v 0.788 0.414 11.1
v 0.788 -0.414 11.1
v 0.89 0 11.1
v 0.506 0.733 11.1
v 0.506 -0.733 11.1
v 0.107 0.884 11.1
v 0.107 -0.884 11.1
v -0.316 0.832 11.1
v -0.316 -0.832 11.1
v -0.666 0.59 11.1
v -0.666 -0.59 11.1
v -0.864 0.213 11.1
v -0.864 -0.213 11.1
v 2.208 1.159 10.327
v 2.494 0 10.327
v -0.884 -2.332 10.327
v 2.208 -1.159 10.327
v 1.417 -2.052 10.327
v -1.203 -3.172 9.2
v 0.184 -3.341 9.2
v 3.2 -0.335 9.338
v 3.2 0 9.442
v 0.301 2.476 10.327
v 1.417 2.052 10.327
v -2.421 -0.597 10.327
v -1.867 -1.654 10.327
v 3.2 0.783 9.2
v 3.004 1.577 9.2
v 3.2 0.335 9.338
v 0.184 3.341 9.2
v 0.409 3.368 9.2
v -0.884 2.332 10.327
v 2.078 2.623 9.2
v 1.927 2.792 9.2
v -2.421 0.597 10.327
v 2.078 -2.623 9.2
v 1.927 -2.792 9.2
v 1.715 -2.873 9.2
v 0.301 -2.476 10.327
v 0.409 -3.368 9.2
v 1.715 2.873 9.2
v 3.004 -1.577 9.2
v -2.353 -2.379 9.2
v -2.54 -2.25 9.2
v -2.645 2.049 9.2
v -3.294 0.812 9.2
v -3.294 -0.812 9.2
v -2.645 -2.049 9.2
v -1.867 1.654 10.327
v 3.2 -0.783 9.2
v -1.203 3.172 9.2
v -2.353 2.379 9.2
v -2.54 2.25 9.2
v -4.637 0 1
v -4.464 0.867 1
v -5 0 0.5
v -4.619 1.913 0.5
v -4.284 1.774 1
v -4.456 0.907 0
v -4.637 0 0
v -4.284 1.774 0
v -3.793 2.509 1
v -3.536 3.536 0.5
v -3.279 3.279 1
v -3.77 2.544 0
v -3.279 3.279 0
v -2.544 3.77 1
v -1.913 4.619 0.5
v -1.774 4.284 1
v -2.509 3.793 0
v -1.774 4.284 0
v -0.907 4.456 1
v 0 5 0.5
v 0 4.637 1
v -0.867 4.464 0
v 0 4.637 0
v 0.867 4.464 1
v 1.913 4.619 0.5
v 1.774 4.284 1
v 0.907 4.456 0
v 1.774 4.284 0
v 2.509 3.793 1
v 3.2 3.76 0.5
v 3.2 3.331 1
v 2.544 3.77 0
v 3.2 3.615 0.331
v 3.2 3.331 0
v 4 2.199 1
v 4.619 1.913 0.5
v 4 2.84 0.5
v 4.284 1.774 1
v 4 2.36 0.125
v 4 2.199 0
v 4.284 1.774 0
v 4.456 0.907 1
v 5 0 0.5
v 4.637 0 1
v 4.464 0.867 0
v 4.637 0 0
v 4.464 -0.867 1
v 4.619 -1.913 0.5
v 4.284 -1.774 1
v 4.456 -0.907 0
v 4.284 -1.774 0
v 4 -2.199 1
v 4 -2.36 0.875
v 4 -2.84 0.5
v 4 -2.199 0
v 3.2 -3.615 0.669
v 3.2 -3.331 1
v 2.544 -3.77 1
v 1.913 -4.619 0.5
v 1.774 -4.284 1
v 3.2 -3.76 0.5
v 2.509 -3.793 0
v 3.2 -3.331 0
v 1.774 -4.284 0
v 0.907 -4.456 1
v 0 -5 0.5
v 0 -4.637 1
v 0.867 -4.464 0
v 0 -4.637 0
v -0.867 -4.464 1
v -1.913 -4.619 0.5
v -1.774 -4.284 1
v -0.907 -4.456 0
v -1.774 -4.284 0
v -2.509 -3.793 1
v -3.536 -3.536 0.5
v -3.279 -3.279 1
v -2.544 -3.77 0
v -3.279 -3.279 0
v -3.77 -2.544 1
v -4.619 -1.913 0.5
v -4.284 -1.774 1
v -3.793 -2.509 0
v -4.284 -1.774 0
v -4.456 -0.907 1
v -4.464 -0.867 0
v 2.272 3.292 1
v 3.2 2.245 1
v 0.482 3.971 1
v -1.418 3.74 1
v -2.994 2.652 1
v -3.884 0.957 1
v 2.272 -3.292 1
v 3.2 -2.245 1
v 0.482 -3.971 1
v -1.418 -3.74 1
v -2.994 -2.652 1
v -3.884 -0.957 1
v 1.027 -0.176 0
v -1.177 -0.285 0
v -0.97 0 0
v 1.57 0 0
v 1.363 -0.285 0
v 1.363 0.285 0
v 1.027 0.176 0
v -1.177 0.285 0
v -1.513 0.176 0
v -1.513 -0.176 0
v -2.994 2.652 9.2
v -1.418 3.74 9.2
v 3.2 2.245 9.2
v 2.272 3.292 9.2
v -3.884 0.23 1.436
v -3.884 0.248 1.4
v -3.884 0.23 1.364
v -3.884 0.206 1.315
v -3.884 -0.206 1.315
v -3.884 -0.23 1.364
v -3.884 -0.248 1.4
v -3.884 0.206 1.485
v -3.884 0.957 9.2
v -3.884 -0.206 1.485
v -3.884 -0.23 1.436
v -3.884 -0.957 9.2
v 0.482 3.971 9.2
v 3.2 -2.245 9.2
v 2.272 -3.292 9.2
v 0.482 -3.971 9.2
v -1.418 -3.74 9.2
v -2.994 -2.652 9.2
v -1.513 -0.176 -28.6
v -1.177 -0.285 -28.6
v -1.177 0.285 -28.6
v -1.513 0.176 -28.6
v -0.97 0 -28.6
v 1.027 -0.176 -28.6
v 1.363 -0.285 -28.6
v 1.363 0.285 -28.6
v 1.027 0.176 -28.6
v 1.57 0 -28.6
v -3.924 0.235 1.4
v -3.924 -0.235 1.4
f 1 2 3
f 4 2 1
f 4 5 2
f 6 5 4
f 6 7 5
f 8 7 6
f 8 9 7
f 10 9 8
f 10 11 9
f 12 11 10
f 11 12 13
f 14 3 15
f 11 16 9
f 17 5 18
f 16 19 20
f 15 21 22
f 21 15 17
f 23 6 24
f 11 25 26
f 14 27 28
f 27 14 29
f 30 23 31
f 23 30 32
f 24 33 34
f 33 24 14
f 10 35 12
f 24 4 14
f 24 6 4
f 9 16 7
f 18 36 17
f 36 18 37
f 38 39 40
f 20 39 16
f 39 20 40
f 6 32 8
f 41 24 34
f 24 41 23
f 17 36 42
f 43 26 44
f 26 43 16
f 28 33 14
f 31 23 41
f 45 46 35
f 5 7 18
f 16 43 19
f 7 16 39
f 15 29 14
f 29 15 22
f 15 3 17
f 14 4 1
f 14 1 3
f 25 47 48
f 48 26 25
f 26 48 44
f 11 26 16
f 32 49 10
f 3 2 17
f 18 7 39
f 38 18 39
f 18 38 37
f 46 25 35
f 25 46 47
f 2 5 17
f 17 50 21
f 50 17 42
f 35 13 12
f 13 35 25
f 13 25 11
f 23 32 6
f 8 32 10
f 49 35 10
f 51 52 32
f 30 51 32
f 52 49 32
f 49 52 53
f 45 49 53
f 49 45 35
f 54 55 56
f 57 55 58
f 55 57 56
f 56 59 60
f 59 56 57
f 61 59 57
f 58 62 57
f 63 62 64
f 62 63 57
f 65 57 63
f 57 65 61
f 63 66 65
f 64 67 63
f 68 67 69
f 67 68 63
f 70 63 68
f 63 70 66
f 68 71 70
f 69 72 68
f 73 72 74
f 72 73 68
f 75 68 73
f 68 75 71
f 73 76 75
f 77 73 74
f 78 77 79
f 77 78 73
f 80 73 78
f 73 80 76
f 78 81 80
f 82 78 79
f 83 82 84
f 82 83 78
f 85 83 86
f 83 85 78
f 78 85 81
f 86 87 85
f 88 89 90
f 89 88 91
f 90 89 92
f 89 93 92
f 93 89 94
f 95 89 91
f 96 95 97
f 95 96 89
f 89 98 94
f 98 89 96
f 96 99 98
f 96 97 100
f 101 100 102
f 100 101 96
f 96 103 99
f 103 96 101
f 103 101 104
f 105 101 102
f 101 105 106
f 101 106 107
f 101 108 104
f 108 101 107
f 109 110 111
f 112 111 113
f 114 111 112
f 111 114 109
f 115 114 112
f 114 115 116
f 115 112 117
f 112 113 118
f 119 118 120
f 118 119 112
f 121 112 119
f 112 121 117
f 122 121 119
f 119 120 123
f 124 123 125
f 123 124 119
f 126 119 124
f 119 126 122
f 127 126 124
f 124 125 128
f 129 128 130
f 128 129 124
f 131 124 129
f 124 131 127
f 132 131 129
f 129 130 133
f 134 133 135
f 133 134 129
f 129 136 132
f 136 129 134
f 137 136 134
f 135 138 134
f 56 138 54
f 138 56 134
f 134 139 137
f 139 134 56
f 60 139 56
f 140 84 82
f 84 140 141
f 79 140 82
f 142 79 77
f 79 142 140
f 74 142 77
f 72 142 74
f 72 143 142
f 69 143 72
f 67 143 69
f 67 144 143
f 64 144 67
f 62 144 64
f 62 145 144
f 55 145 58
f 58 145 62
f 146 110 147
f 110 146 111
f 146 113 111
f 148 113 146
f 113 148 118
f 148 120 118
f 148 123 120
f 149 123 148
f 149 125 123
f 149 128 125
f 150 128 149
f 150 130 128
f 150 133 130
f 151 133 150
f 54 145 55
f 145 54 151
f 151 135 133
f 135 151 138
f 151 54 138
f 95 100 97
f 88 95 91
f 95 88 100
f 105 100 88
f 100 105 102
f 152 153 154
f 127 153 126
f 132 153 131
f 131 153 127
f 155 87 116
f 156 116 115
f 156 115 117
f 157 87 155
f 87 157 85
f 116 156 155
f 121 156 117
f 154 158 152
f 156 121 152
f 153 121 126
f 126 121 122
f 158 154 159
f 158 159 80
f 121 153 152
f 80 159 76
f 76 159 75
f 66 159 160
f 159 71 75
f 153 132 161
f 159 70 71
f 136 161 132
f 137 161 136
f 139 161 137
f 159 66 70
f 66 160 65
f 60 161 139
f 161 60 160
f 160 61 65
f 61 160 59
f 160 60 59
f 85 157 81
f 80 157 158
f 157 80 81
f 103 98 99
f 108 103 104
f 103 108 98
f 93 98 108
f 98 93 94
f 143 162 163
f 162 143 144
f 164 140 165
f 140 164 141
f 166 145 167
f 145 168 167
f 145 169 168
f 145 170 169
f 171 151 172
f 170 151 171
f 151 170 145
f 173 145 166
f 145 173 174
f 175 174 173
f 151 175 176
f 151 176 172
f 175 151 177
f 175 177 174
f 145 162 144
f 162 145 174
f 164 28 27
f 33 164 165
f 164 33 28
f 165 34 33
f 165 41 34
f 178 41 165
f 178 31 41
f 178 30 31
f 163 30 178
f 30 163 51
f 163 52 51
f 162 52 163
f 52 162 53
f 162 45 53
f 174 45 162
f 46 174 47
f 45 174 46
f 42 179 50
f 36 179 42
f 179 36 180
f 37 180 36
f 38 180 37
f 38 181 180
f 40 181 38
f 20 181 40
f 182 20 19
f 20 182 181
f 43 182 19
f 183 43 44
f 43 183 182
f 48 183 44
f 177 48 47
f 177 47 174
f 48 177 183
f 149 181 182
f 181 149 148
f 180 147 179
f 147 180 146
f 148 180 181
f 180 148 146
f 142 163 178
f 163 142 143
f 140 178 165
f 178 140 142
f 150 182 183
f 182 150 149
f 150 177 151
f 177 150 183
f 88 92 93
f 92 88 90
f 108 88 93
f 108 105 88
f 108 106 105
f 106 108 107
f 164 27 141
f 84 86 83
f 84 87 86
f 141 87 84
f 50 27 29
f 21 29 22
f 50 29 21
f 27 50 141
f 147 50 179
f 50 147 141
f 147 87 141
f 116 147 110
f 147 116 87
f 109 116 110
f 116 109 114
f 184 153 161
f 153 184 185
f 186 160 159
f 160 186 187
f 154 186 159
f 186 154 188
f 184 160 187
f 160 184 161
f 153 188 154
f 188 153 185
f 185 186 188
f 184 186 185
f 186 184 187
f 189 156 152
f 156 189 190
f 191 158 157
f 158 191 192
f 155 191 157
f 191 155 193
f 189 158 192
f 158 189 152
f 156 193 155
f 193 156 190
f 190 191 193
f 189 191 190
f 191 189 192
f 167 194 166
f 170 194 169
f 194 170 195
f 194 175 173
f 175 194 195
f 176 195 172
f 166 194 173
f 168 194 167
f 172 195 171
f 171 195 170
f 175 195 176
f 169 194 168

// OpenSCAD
// Parameters
body_diameter = 8.0; //[4.0:16.0:0.1]
body_height = 9.2; //[4.6:18.4:0.1]
lead_diameter = 0.6; //[0.3:1.2:0.05]
lead_length_below_body = 25.0; //[12.5:50.0:0.5]
lead_pitch = 2.54; //[1.27:5.08:0.01]
lens_dome_height = 2.0; //[1.0:4.0:0.1]
base_flange_height = 1.0; //[0.5:2.0:0.1]
lead_straight_length_before_bend = 3.0; //[1.0:8.0:0.1]
overlap = 1.0; //[0.5:2.0:0.1]
cathode_flat_depth = 0.8; //[0.4:1.6:0.05]
internal_post_radius = 0.8; //[0.4:1.6:0.05]
internal_post_height = 5.0; //[2.5:10.0:0.1]
marking_bump_radius = 0.4; //[0.2:1.0:0.05]

// LED Body with Dome
module led_body_with_dome() {
  union() {
    // Main cylindrical body
    translate([0, 0, body_height/2])
      cylinder(r=body_diameter/2, h=body_height, center=true);

    // Lens dome
    intersection() {
      translate([0, 0, body_height + lens_dome_height - body_diameter/2])
        sphere(r=body_diameter/2, center=true);
      translate([0, 0, body_height + lens_dome_height + body_diameter/2])
        cube([body_diameter*2, body_diameter*2, body_diameter*2], center=true);
    }

    // Meniscus at base
    intersection() {
      translate([0, 0, base_flange_height/2])
        rotate_extrude() translate([body_diameter/2, 0, 0]) circle(r=base_flange_height);
      translate([0, 0, base_flange_height/2])
        cube([body_diameter*3, body_diameter*3, base_flange_height], center=true);
    }
  }
}

// Cathode Flat
module cathode_flat() {
  difference() {
    led_body_with_dome();
    translate([body_diameter/2 - cathode_flat_depth/2, 0, (body_height + lens_dome_height)/2])
      cube([cathode_flat_depth, body_diameter*2, body_height + lens_dome_height + base_flange_height], center=true);
  }
}

// Leads
module leads() {
  union() {
    // Left lead
    translate([-lead_pitch/2, 0, (body_height - (lead_length_below_body + body_height - overlap))/2])
      cylinder(r=lead_diameter/2, h=lead_length_below_body + body_height - overlap, center=true);

    // Right lead
    translate([lead_pitch/2, 0, (body_height - (lead_length_below_body + body_height - overlap))/2])
      cylinder(r=lead_diameter/2, h=lead_length_below_body + body_height - overlap, center=true);

    // Bridge between leads
    translate([0, 0, lead_diameter/2])
      cube([lead_pitch + lead_diameter - overlap, lead_diameter, lead_diameter], center=true);
  }
}

// Internal Silhouettes
module internal_silhouettes() {
  union() {
    // Anvil post
    translate([-lead_pitch/2, 0, base_flange_height + internal_post_height/2])
      cylinder(r=internal_post_radius, h=internal_post_height, center=true);

    // Anvil plate
    translate([-lead_pitch/2, 0, base_flange_height + internal_post_height - body_diameter*0.075])
      cube([body_diameter*0.35, body_diameter*0.25, body_diameter*0.15], center=true);
  }
}

// Markings
module markings() {
  union() {
    // Marking bump
    translate([-(body_diameter/2 - marking_bump_radius), 0, base_flange_height + marking_bump_radius])
      sphere(r=marking_bump_radius, center=true);
  }
}

// Complete LED
module led_complete() {
  union() {
    cathode_flat();
    leads();
    internal_silhouettes();
    markings();
  }
}

// Render the complete LED
led_complete();
